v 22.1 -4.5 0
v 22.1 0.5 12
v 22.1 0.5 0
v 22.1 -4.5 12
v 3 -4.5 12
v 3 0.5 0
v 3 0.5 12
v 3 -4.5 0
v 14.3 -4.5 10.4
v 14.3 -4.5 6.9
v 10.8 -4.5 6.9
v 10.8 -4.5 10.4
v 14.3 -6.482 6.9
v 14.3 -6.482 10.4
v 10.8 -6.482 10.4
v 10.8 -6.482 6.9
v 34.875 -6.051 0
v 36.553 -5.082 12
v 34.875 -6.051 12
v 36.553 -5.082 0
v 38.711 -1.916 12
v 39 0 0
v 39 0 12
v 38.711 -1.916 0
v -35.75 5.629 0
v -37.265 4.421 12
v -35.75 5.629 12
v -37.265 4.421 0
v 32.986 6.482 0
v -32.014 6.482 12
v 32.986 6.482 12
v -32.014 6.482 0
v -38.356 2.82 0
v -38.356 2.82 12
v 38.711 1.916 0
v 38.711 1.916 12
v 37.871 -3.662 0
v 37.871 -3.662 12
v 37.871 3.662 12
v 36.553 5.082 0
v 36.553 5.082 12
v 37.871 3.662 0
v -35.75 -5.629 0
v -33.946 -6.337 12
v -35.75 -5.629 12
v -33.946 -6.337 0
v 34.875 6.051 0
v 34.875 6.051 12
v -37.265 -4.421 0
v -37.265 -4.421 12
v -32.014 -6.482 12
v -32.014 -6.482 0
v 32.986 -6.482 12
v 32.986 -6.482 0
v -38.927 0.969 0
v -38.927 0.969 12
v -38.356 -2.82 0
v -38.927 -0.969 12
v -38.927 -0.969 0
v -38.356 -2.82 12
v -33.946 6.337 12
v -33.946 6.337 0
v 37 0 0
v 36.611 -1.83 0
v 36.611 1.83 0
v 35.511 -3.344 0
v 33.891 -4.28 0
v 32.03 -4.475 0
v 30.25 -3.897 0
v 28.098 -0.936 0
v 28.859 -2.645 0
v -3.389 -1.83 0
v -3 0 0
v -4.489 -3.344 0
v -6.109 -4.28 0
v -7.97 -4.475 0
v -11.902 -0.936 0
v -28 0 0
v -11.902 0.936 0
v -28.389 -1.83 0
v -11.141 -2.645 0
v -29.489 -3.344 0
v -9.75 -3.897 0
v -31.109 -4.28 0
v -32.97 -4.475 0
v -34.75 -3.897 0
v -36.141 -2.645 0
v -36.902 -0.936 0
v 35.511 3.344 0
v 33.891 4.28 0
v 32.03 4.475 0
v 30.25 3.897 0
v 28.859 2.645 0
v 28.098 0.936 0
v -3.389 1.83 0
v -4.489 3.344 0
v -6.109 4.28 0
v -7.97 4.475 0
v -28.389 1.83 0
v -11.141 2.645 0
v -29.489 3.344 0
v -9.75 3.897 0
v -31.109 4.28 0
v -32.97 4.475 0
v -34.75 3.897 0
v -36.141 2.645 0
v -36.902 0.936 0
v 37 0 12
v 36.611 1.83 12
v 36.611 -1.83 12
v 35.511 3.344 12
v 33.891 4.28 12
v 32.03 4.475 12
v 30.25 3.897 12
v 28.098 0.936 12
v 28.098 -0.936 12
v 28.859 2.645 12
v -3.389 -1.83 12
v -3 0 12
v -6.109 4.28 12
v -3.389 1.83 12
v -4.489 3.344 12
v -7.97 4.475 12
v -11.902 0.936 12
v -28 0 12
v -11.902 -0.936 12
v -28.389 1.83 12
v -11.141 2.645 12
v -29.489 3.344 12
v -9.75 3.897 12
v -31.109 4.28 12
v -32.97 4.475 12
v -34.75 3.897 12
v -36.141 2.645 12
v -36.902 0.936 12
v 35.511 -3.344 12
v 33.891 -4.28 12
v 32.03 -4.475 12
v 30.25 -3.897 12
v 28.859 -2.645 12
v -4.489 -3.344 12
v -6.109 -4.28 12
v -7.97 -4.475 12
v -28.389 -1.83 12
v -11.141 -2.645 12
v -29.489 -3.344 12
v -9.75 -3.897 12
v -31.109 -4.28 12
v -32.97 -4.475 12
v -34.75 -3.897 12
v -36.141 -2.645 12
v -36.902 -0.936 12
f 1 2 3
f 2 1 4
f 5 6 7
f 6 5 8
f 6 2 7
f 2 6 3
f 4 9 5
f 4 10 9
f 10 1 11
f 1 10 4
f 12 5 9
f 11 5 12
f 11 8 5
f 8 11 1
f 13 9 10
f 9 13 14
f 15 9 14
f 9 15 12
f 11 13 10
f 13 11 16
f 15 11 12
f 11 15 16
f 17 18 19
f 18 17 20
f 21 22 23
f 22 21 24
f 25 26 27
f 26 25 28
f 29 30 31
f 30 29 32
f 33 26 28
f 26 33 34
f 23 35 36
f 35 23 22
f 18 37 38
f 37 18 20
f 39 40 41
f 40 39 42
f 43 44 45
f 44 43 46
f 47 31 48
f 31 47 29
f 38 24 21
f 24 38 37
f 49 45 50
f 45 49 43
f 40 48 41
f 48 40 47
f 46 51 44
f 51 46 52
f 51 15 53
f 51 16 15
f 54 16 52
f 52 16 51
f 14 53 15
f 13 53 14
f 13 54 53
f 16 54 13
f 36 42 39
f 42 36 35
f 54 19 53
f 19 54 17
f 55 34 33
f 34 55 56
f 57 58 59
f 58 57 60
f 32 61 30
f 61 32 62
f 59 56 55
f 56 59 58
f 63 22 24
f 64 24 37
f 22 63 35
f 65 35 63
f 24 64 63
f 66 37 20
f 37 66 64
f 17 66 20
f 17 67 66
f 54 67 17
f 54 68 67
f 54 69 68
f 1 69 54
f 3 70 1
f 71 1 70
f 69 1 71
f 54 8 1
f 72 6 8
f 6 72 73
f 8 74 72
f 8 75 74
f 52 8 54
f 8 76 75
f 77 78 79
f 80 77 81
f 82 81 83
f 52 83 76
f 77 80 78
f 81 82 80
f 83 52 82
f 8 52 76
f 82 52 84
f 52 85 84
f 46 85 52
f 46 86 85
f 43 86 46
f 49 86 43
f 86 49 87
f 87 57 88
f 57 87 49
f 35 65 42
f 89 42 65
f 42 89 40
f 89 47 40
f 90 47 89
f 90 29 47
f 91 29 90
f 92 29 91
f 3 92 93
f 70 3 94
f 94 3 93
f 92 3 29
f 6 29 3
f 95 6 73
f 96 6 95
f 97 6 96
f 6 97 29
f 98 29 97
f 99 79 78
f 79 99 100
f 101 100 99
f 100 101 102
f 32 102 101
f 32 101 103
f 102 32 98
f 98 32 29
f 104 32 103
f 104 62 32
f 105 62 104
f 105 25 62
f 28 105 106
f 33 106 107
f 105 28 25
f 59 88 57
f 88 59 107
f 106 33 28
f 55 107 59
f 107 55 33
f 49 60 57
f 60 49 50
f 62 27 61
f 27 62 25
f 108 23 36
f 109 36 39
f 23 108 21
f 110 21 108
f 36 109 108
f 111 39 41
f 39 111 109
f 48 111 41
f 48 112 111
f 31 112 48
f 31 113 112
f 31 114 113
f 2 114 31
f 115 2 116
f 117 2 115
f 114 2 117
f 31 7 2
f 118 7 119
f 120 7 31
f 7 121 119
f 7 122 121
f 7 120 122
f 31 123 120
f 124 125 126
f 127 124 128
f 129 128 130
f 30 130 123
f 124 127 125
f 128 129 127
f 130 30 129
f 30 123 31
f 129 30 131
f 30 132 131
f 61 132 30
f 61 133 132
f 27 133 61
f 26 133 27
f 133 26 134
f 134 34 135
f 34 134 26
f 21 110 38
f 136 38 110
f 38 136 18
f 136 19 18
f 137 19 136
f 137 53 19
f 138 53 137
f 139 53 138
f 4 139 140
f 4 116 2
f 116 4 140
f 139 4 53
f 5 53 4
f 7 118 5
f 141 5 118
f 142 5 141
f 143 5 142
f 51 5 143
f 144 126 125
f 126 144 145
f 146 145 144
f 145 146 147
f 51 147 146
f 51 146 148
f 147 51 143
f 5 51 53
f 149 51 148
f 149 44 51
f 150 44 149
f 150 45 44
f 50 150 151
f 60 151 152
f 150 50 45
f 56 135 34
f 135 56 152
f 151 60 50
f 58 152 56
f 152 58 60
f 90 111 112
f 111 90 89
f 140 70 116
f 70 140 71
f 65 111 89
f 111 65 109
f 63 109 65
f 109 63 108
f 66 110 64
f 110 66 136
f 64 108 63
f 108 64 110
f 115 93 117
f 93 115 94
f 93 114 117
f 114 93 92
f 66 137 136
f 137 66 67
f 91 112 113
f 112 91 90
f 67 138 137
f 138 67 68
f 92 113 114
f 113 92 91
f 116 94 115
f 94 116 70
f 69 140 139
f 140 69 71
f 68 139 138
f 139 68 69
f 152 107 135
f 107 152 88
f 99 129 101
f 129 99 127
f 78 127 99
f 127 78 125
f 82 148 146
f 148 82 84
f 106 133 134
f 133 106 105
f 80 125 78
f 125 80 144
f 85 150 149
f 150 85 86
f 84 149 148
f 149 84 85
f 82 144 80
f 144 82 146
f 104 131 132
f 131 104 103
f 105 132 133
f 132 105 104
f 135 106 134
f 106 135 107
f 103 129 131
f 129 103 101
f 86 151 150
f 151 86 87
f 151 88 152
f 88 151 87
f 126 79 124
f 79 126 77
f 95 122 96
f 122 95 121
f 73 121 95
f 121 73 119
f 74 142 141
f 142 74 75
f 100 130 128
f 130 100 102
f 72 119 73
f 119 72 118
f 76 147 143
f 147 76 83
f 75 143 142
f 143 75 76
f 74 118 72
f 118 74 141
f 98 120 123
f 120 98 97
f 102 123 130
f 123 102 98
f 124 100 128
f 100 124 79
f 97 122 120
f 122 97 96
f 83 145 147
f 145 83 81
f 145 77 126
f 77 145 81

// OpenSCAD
// Frame rod diameter in mm
rod_d = 9;

// Frame rod spacing, mm (outer - to - outer)
rod_spacing = 74;

// Thickness of the part in mm
thickness = 12;

// Thickness of material outside the holes.
thickness_edge = 2;


rod_r = rod_d / 2;

offset = (rod_spacing - rod_r * 2)/2;

e = 0.1;

generic_offset = 3;

button_r = 9/2;
button_offset = button_r + generic_offset;

led_w = 19.1;
led_h = 5;
led_offset = generic_offset;
// width of the actual LED component
led_side = 3.5;
led_from_usb = 7;

module main_bar() {
    hull() {
        translate([-offset, 0, 0])
            cylinder(r = rod_r + thickness_edge, h = thickness);
        translate([offset, 0, 0])
            cylinder(r = rod_r + thickness_edge, h = thickness);
    }
}



difference() {
    main_bar();
    
    // mounting holes
    translate([offset, 0, -e])
        cylinder(r = rod_r, h = thickness + 2 * e);
    
    translate([-offset, 0, -e])
        cylinder(r = rod_r, h = thickness + 2 * e);
    
    // safety button
    translate([-button_offset, 0, -e])
        cylinder(r = button_r, h = thickness + 2 * e);
    
    // led + usb module
    y_offs = rod_r;
    
    translate([led_offset, -y_offs, -e]) {
        cube([led_w, led_h, thickness + e * 2]);
        translate([
                led_w / 2 - led_side / 2,
                -thickness_edge - e,
                led_from_usb])
            cube([led_side, thickness_edge + 2*e, led_side]);
    }
}
